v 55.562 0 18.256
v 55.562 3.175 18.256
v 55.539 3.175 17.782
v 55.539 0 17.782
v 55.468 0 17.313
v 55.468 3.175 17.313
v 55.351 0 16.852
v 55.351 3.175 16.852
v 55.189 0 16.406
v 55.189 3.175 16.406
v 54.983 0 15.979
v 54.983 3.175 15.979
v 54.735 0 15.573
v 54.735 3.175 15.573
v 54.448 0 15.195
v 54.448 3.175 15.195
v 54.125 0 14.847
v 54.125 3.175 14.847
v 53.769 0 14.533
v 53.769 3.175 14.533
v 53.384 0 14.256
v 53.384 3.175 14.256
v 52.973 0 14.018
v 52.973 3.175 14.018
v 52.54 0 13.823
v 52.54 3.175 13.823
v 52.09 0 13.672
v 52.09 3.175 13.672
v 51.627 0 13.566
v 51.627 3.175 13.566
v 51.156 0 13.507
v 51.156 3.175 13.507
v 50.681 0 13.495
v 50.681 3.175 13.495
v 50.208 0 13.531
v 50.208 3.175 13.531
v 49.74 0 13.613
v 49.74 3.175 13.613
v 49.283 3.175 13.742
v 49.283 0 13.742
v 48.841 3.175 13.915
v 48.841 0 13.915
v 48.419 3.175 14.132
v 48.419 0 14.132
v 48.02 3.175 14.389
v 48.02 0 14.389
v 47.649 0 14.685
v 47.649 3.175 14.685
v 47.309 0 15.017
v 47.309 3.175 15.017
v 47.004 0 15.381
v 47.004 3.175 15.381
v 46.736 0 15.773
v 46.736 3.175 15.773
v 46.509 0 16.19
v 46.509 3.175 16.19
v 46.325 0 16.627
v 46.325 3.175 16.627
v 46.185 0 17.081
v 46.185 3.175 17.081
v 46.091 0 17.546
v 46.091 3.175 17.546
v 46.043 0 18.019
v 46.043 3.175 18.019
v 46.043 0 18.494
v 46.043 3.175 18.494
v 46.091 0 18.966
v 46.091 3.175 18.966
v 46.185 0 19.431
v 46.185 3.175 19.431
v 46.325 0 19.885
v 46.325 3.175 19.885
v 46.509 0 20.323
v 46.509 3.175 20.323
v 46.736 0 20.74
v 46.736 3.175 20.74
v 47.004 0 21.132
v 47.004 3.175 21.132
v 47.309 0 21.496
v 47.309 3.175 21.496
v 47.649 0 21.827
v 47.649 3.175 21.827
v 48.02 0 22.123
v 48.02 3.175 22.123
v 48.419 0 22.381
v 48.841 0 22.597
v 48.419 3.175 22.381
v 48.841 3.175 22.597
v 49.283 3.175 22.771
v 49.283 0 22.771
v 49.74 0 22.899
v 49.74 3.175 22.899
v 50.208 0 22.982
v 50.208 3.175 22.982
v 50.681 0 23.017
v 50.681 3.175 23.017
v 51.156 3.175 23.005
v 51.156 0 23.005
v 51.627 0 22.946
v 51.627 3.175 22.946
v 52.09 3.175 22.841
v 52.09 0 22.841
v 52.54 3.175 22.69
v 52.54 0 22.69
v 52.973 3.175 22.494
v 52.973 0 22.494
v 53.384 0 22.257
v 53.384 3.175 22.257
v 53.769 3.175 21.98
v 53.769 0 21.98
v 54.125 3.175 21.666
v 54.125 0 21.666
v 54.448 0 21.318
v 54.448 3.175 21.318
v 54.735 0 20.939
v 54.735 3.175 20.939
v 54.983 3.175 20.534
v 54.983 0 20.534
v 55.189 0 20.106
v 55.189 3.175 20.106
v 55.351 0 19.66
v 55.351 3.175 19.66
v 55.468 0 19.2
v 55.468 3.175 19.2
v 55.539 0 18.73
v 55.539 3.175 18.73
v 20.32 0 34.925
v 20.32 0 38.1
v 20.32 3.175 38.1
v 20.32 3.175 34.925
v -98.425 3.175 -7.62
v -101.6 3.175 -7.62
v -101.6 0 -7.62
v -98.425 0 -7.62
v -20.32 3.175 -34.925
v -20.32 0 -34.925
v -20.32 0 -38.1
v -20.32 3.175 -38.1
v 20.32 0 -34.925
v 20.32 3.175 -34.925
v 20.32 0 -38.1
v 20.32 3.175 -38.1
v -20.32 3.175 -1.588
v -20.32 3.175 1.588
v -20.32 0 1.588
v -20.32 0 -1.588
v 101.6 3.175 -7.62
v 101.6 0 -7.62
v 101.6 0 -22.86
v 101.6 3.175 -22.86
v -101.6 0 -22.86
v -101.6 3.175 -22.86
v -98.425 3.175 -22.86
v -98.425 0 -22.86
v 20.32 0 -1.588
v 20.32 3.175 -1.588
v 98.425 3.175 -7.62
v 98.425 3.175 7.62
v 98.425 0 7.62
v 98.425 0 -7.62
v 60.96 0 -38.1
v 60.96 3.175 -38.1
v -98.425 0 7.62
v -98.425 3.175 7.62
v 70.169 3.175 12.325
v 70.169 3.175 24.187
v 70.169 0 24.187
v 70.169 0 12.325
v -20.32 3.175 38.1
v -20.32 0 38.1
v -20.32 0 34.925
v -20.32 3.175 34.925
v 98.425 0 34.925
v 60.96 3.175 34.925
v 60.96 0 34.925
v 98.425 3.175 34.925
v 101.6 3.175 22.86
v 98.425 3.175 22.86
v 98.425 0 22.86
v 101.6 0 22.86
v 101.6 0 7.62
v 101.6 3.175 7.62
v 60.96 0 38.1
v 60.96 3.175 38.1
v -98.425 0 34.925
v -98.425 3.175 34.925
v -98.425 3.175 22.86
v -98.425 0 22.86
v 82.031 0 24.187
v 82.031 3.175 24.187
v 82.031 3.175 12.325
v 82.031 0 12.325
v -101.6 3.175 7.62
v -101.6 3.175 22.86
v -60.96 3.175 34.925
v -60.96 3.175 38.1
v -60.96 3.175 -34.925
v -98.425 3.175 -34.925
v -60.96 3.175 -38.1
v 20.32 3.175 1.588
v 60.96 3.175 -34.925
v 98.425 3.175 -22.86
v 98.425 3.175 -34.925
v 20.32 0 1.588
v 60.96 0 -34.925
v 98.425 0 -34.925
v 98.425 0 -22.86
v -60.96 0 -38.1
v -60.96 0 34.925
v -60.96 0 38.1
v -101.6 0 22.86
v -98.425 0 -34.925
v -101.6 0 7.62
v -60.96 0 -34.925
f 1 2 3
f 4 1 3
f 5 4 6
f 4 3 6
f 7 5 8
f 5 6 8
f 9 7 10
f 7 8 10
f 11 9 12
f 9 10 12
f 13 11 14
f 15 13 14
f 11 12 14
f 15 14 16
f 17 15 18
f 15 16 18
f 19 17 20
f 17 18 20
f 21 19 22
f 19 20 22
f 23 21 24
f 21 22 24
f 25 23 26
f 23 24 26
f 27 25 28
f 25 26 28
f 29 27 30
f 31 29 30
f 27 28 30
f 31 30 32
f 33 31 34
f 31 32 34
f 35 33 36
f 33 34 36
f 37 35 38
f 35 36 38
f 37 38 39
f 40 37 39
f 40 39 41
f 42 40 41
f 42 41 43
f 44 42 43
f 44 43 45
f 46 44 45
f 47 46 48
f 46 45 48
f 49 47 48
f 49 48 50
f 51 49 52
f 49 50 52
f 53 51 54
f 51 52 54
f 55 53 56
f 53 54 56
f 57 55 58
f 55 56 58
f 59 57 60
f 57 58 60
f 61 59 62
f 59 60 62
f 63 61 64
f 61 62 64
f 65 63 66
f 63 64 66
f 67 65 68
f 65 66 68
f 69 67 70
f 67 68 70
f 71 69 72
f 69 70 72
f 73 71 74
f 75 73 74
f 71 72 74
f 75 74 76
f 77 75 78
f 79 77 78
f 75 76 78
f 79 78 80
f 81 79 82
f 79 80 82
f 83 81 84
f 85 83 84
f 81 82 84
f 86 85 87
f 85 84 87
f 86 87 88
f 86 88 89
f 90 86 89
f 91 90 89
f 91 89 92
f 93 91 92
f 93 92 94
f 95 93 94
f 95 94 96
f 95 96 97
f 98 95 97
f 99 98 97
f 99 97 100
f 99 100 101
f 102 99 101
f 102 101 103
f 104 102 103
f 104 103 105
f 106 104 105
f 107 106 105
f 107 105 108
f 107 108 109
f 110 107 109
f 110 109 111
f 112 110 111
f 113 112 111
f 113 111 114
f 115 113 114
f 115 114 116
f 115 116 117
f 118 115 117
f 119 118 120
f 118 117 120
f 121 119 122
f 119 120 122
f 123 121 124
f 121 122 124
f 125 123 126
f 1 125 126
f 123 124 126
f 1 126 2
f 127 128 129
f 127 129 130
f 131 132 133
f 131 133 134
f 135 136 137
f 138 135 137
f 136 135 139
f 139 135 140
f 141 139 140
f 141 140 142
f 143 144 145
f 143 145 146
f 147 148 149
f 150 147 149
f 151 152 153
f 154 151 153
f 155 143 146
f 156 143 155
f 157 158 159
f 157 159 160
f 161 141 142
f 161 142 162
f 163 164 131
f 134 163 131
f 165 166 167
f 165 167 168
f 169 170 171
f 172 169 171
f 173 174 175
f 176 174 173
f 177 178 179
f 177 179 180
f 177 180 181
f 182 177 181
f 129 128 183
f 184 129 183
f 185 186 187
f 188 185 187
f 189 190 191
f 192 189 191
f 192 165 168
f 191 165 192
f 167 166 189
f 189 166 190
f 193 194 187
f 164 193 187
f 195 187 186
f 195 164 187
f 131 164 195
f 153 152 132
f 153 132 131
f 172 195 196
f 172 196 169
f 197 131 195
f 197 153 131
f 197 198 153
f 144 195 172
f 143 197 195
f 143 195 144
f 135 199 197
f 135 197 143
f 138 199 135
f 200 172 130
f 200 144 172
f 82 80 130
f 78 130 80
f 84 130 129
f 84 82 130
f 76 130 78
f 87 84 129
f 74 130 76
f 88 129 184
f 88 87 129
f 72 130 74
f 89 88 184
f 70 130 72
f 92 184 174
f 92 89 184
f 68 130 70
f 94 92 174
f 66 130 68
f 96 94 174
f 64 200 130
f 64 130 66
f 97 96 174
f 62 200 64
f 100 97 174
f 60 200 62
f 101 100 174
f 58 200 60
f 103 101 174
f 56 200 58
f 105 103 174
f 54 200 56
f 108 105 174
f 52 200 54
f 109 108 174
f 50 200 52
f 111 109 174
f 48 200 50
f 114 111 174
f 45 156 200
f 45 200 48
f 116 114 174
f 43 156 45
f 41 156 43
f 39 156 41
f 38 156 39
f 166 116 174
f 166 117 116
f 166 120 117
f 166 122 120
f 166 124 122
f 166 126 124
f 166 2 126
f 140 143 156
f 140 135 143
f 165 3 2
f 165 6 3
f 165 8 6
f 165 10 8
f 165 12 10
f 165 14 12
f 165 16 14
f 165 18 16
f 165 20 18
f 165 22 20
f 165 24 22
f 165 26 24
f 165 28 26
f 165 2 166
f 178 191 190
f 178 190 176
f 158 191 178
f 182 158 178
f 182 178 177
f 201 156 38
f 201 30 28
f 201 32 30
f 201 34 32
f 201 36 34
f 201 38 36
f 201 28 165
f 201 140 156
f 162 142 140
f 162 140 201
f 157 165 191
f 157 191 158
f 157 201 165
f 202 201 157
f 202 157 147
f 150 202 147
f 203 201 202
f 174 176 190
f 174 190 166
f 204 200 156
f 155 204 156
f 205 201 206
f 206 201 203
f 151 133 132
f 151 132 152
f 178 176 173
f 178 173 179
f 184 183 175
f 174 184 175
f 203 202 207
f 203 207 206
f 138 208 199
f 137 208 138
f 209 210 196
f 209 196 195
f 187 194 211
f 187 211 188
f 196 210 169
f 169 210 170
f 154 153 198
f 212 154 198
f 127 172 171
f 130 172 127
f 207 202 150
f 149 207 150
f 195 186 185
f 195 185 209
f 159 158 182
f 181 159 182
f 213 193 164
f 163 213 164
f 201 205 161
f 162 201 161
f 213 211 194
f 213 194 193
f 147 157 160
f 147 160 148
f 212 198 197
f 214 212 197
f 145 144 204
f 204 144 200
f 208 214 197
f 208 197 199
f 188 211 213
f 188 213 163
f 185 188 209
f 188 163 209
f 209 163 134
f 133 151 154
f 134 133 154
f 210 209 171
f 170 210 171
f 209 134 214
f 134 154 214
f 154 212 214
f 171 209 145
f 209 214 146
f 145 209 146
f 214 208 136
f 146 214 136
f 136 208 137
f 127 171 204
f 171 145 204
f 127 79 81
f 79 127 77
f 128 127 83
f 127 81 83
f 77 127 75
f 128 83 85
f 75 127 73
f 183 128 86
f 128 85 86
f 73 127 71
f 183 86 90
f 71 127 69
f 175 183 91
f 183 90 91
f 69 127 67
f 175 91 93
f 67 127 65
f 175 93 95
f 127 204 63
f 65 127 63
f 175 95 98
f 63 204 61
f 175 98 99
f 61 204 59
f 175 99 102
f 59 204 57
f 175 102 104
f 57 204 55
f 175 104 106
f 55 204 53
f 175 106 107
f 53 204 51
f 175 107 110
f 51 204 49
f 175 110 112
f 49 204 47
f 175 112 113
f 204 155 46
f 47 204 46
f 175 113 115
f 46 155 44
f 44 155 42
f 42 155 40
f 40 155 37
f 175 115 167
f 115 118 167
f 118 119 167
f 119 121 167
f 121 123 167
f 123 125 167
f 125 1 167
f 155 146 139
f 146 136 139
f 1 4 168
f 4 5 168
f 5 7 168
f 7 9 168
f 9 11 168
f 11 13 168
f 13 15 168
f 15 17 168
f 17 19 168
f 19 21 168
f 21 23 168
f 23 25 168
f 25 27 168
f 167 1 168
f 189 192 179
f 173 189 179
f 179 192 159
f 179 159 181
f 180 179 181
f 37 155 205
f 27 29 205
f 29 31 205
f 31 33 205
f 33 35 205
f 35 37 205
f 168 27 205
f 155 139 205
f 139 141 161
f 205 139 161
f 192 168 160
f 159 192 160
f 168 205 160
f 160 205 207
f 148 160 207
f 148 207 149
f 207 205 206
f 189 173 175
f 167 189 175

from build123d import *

# Parameters (mm, degrees)
SKETCH1_W           = 203.2
SKETCH1_H           = 76.2
BOSS_EXTRUDE1_DEPTH = 3.175
SKETCH2_W           = 40.64
SKETCH2_H           = 3.175
CUT_EXTRUDE1_DEPTH  = 3.175
LPATTERN1_COUNT     = 3
LPATTERN1_PITCH     = 81.28
SKETCH3_W           = 3.175
SKETCH3_H           = 15.24
CUT_EXTRUDE2_DEPTH  = 3.175
LPATTERN2_COUNT     = 3
LPATTERN2_PITCH     = 30.48
SKETCH4_R           = 4.7625
SKETCH4_W           = 11.8618
SKETCH4_H           = 11.8618
CUT_EXTRUDE5_DEPTH  = 3.175
SKETCH5_W           = 40.64
SKETCH5_H           = 3.175
CUT_EXTRUDE6_DEPTH  = 3.175


with BuildPart() as part:
    # Sketch1 → Boss-Extrude1 (new body)
    with BuildSketch(Plane(origin=(0, 0, 0), x_dir=(1, 0, 0), z_dir=(0, 1, 0))):
        Rectangle(SKETCH1_W, SKETCH1_H)
    extrude(amount=BOSS_EXTRUDE1_DEPTH)

    # Sketch2 → Cut-Extrude1 (cut)
    with BuildSketch(Plane(origin=(0, 3.175, 0), x_dir=(1, 0, 0), z_dir=(0, 1, 0))):
        with Locations((-81.28, 36.5125)):
            Rectangle(SKETCH2_W, SKETCH2_H)
        with Locations((-81.28, -36.5125)):
            Rectangle(SKETCH2_W, SKETCH2_H)
    cut_extrude1 = extrude(amount=-CUT_EXTRUDE1_DEPTH, mode=Mode.SUBTRACT)

    # LPattern1: Cut-Extrude1 ×3
    with Locations(*[(i * LPATTERN1_PITCH, 0, 0) for i in range(1, LPATTERN1_COUNT)]):
        add(cut_extrude1, mode=Mode.SUBTRACT)

    # Sketch3 → Cut-Extrude2 (cut)
    with BuildSketch(Plane(origin=(0, 3.175, 0), x_dir=(1, 0, 0), z_dir=(0, 1, 0))):
        with Locations((100.0125, 30.48)):
            Rectangle(SKETCH3_W, SKETCH3_H)
        with Locations((-100.0125, 30.48)):
            Rectangle(SKETCH3_W, SKETCH3_H)
    cut_extrude2 = extrude(amount=-CUT_EXTRUDE2_DEPTH, mode=Mode.SUBTRACT)

    # LPattern2: Cut-Extrude2 ×3
    with Locations(*[(0, 0, i * LPATTERN2_PITCH) for i in range(1, LPATTERN2_COUNT)]):
        add(cut_extrude2, mode=Mode.SUBTRACT)

    # Sketch4 → Cut-Extrude5 (cut)
    with BuildSketch(Plane(origin=(0, 3.175, 0), x_dir=(1, 0, 0), z_dir=(0, 1, 0))):
        with Locations((50.8, -18.25625)):
            Circle(SKETCH4_R)
        with Locations((76.099679649, -18.25625)):
            Rectangle(SKETCH4_W, SKETCH4_H)
    extrude(amount=-CUT_EXTRUDE5_DEPTH, mode=Mode.SUBTRACT)

    # Sketch5 → Cut-Extrude6 (cut)
    with BuildSketch(Plane(origin=(0, 3.175, 0), x_dir=(1, 0, 0), z_dir=(0, 1, 0))):
        Rectangle(SKETCH5_W, SKETCH5_H)
    extrude(amount=-CUT_EXTRUDE6_DEPTH, mode=Mode.SUBTRACT)


solid = part.part
